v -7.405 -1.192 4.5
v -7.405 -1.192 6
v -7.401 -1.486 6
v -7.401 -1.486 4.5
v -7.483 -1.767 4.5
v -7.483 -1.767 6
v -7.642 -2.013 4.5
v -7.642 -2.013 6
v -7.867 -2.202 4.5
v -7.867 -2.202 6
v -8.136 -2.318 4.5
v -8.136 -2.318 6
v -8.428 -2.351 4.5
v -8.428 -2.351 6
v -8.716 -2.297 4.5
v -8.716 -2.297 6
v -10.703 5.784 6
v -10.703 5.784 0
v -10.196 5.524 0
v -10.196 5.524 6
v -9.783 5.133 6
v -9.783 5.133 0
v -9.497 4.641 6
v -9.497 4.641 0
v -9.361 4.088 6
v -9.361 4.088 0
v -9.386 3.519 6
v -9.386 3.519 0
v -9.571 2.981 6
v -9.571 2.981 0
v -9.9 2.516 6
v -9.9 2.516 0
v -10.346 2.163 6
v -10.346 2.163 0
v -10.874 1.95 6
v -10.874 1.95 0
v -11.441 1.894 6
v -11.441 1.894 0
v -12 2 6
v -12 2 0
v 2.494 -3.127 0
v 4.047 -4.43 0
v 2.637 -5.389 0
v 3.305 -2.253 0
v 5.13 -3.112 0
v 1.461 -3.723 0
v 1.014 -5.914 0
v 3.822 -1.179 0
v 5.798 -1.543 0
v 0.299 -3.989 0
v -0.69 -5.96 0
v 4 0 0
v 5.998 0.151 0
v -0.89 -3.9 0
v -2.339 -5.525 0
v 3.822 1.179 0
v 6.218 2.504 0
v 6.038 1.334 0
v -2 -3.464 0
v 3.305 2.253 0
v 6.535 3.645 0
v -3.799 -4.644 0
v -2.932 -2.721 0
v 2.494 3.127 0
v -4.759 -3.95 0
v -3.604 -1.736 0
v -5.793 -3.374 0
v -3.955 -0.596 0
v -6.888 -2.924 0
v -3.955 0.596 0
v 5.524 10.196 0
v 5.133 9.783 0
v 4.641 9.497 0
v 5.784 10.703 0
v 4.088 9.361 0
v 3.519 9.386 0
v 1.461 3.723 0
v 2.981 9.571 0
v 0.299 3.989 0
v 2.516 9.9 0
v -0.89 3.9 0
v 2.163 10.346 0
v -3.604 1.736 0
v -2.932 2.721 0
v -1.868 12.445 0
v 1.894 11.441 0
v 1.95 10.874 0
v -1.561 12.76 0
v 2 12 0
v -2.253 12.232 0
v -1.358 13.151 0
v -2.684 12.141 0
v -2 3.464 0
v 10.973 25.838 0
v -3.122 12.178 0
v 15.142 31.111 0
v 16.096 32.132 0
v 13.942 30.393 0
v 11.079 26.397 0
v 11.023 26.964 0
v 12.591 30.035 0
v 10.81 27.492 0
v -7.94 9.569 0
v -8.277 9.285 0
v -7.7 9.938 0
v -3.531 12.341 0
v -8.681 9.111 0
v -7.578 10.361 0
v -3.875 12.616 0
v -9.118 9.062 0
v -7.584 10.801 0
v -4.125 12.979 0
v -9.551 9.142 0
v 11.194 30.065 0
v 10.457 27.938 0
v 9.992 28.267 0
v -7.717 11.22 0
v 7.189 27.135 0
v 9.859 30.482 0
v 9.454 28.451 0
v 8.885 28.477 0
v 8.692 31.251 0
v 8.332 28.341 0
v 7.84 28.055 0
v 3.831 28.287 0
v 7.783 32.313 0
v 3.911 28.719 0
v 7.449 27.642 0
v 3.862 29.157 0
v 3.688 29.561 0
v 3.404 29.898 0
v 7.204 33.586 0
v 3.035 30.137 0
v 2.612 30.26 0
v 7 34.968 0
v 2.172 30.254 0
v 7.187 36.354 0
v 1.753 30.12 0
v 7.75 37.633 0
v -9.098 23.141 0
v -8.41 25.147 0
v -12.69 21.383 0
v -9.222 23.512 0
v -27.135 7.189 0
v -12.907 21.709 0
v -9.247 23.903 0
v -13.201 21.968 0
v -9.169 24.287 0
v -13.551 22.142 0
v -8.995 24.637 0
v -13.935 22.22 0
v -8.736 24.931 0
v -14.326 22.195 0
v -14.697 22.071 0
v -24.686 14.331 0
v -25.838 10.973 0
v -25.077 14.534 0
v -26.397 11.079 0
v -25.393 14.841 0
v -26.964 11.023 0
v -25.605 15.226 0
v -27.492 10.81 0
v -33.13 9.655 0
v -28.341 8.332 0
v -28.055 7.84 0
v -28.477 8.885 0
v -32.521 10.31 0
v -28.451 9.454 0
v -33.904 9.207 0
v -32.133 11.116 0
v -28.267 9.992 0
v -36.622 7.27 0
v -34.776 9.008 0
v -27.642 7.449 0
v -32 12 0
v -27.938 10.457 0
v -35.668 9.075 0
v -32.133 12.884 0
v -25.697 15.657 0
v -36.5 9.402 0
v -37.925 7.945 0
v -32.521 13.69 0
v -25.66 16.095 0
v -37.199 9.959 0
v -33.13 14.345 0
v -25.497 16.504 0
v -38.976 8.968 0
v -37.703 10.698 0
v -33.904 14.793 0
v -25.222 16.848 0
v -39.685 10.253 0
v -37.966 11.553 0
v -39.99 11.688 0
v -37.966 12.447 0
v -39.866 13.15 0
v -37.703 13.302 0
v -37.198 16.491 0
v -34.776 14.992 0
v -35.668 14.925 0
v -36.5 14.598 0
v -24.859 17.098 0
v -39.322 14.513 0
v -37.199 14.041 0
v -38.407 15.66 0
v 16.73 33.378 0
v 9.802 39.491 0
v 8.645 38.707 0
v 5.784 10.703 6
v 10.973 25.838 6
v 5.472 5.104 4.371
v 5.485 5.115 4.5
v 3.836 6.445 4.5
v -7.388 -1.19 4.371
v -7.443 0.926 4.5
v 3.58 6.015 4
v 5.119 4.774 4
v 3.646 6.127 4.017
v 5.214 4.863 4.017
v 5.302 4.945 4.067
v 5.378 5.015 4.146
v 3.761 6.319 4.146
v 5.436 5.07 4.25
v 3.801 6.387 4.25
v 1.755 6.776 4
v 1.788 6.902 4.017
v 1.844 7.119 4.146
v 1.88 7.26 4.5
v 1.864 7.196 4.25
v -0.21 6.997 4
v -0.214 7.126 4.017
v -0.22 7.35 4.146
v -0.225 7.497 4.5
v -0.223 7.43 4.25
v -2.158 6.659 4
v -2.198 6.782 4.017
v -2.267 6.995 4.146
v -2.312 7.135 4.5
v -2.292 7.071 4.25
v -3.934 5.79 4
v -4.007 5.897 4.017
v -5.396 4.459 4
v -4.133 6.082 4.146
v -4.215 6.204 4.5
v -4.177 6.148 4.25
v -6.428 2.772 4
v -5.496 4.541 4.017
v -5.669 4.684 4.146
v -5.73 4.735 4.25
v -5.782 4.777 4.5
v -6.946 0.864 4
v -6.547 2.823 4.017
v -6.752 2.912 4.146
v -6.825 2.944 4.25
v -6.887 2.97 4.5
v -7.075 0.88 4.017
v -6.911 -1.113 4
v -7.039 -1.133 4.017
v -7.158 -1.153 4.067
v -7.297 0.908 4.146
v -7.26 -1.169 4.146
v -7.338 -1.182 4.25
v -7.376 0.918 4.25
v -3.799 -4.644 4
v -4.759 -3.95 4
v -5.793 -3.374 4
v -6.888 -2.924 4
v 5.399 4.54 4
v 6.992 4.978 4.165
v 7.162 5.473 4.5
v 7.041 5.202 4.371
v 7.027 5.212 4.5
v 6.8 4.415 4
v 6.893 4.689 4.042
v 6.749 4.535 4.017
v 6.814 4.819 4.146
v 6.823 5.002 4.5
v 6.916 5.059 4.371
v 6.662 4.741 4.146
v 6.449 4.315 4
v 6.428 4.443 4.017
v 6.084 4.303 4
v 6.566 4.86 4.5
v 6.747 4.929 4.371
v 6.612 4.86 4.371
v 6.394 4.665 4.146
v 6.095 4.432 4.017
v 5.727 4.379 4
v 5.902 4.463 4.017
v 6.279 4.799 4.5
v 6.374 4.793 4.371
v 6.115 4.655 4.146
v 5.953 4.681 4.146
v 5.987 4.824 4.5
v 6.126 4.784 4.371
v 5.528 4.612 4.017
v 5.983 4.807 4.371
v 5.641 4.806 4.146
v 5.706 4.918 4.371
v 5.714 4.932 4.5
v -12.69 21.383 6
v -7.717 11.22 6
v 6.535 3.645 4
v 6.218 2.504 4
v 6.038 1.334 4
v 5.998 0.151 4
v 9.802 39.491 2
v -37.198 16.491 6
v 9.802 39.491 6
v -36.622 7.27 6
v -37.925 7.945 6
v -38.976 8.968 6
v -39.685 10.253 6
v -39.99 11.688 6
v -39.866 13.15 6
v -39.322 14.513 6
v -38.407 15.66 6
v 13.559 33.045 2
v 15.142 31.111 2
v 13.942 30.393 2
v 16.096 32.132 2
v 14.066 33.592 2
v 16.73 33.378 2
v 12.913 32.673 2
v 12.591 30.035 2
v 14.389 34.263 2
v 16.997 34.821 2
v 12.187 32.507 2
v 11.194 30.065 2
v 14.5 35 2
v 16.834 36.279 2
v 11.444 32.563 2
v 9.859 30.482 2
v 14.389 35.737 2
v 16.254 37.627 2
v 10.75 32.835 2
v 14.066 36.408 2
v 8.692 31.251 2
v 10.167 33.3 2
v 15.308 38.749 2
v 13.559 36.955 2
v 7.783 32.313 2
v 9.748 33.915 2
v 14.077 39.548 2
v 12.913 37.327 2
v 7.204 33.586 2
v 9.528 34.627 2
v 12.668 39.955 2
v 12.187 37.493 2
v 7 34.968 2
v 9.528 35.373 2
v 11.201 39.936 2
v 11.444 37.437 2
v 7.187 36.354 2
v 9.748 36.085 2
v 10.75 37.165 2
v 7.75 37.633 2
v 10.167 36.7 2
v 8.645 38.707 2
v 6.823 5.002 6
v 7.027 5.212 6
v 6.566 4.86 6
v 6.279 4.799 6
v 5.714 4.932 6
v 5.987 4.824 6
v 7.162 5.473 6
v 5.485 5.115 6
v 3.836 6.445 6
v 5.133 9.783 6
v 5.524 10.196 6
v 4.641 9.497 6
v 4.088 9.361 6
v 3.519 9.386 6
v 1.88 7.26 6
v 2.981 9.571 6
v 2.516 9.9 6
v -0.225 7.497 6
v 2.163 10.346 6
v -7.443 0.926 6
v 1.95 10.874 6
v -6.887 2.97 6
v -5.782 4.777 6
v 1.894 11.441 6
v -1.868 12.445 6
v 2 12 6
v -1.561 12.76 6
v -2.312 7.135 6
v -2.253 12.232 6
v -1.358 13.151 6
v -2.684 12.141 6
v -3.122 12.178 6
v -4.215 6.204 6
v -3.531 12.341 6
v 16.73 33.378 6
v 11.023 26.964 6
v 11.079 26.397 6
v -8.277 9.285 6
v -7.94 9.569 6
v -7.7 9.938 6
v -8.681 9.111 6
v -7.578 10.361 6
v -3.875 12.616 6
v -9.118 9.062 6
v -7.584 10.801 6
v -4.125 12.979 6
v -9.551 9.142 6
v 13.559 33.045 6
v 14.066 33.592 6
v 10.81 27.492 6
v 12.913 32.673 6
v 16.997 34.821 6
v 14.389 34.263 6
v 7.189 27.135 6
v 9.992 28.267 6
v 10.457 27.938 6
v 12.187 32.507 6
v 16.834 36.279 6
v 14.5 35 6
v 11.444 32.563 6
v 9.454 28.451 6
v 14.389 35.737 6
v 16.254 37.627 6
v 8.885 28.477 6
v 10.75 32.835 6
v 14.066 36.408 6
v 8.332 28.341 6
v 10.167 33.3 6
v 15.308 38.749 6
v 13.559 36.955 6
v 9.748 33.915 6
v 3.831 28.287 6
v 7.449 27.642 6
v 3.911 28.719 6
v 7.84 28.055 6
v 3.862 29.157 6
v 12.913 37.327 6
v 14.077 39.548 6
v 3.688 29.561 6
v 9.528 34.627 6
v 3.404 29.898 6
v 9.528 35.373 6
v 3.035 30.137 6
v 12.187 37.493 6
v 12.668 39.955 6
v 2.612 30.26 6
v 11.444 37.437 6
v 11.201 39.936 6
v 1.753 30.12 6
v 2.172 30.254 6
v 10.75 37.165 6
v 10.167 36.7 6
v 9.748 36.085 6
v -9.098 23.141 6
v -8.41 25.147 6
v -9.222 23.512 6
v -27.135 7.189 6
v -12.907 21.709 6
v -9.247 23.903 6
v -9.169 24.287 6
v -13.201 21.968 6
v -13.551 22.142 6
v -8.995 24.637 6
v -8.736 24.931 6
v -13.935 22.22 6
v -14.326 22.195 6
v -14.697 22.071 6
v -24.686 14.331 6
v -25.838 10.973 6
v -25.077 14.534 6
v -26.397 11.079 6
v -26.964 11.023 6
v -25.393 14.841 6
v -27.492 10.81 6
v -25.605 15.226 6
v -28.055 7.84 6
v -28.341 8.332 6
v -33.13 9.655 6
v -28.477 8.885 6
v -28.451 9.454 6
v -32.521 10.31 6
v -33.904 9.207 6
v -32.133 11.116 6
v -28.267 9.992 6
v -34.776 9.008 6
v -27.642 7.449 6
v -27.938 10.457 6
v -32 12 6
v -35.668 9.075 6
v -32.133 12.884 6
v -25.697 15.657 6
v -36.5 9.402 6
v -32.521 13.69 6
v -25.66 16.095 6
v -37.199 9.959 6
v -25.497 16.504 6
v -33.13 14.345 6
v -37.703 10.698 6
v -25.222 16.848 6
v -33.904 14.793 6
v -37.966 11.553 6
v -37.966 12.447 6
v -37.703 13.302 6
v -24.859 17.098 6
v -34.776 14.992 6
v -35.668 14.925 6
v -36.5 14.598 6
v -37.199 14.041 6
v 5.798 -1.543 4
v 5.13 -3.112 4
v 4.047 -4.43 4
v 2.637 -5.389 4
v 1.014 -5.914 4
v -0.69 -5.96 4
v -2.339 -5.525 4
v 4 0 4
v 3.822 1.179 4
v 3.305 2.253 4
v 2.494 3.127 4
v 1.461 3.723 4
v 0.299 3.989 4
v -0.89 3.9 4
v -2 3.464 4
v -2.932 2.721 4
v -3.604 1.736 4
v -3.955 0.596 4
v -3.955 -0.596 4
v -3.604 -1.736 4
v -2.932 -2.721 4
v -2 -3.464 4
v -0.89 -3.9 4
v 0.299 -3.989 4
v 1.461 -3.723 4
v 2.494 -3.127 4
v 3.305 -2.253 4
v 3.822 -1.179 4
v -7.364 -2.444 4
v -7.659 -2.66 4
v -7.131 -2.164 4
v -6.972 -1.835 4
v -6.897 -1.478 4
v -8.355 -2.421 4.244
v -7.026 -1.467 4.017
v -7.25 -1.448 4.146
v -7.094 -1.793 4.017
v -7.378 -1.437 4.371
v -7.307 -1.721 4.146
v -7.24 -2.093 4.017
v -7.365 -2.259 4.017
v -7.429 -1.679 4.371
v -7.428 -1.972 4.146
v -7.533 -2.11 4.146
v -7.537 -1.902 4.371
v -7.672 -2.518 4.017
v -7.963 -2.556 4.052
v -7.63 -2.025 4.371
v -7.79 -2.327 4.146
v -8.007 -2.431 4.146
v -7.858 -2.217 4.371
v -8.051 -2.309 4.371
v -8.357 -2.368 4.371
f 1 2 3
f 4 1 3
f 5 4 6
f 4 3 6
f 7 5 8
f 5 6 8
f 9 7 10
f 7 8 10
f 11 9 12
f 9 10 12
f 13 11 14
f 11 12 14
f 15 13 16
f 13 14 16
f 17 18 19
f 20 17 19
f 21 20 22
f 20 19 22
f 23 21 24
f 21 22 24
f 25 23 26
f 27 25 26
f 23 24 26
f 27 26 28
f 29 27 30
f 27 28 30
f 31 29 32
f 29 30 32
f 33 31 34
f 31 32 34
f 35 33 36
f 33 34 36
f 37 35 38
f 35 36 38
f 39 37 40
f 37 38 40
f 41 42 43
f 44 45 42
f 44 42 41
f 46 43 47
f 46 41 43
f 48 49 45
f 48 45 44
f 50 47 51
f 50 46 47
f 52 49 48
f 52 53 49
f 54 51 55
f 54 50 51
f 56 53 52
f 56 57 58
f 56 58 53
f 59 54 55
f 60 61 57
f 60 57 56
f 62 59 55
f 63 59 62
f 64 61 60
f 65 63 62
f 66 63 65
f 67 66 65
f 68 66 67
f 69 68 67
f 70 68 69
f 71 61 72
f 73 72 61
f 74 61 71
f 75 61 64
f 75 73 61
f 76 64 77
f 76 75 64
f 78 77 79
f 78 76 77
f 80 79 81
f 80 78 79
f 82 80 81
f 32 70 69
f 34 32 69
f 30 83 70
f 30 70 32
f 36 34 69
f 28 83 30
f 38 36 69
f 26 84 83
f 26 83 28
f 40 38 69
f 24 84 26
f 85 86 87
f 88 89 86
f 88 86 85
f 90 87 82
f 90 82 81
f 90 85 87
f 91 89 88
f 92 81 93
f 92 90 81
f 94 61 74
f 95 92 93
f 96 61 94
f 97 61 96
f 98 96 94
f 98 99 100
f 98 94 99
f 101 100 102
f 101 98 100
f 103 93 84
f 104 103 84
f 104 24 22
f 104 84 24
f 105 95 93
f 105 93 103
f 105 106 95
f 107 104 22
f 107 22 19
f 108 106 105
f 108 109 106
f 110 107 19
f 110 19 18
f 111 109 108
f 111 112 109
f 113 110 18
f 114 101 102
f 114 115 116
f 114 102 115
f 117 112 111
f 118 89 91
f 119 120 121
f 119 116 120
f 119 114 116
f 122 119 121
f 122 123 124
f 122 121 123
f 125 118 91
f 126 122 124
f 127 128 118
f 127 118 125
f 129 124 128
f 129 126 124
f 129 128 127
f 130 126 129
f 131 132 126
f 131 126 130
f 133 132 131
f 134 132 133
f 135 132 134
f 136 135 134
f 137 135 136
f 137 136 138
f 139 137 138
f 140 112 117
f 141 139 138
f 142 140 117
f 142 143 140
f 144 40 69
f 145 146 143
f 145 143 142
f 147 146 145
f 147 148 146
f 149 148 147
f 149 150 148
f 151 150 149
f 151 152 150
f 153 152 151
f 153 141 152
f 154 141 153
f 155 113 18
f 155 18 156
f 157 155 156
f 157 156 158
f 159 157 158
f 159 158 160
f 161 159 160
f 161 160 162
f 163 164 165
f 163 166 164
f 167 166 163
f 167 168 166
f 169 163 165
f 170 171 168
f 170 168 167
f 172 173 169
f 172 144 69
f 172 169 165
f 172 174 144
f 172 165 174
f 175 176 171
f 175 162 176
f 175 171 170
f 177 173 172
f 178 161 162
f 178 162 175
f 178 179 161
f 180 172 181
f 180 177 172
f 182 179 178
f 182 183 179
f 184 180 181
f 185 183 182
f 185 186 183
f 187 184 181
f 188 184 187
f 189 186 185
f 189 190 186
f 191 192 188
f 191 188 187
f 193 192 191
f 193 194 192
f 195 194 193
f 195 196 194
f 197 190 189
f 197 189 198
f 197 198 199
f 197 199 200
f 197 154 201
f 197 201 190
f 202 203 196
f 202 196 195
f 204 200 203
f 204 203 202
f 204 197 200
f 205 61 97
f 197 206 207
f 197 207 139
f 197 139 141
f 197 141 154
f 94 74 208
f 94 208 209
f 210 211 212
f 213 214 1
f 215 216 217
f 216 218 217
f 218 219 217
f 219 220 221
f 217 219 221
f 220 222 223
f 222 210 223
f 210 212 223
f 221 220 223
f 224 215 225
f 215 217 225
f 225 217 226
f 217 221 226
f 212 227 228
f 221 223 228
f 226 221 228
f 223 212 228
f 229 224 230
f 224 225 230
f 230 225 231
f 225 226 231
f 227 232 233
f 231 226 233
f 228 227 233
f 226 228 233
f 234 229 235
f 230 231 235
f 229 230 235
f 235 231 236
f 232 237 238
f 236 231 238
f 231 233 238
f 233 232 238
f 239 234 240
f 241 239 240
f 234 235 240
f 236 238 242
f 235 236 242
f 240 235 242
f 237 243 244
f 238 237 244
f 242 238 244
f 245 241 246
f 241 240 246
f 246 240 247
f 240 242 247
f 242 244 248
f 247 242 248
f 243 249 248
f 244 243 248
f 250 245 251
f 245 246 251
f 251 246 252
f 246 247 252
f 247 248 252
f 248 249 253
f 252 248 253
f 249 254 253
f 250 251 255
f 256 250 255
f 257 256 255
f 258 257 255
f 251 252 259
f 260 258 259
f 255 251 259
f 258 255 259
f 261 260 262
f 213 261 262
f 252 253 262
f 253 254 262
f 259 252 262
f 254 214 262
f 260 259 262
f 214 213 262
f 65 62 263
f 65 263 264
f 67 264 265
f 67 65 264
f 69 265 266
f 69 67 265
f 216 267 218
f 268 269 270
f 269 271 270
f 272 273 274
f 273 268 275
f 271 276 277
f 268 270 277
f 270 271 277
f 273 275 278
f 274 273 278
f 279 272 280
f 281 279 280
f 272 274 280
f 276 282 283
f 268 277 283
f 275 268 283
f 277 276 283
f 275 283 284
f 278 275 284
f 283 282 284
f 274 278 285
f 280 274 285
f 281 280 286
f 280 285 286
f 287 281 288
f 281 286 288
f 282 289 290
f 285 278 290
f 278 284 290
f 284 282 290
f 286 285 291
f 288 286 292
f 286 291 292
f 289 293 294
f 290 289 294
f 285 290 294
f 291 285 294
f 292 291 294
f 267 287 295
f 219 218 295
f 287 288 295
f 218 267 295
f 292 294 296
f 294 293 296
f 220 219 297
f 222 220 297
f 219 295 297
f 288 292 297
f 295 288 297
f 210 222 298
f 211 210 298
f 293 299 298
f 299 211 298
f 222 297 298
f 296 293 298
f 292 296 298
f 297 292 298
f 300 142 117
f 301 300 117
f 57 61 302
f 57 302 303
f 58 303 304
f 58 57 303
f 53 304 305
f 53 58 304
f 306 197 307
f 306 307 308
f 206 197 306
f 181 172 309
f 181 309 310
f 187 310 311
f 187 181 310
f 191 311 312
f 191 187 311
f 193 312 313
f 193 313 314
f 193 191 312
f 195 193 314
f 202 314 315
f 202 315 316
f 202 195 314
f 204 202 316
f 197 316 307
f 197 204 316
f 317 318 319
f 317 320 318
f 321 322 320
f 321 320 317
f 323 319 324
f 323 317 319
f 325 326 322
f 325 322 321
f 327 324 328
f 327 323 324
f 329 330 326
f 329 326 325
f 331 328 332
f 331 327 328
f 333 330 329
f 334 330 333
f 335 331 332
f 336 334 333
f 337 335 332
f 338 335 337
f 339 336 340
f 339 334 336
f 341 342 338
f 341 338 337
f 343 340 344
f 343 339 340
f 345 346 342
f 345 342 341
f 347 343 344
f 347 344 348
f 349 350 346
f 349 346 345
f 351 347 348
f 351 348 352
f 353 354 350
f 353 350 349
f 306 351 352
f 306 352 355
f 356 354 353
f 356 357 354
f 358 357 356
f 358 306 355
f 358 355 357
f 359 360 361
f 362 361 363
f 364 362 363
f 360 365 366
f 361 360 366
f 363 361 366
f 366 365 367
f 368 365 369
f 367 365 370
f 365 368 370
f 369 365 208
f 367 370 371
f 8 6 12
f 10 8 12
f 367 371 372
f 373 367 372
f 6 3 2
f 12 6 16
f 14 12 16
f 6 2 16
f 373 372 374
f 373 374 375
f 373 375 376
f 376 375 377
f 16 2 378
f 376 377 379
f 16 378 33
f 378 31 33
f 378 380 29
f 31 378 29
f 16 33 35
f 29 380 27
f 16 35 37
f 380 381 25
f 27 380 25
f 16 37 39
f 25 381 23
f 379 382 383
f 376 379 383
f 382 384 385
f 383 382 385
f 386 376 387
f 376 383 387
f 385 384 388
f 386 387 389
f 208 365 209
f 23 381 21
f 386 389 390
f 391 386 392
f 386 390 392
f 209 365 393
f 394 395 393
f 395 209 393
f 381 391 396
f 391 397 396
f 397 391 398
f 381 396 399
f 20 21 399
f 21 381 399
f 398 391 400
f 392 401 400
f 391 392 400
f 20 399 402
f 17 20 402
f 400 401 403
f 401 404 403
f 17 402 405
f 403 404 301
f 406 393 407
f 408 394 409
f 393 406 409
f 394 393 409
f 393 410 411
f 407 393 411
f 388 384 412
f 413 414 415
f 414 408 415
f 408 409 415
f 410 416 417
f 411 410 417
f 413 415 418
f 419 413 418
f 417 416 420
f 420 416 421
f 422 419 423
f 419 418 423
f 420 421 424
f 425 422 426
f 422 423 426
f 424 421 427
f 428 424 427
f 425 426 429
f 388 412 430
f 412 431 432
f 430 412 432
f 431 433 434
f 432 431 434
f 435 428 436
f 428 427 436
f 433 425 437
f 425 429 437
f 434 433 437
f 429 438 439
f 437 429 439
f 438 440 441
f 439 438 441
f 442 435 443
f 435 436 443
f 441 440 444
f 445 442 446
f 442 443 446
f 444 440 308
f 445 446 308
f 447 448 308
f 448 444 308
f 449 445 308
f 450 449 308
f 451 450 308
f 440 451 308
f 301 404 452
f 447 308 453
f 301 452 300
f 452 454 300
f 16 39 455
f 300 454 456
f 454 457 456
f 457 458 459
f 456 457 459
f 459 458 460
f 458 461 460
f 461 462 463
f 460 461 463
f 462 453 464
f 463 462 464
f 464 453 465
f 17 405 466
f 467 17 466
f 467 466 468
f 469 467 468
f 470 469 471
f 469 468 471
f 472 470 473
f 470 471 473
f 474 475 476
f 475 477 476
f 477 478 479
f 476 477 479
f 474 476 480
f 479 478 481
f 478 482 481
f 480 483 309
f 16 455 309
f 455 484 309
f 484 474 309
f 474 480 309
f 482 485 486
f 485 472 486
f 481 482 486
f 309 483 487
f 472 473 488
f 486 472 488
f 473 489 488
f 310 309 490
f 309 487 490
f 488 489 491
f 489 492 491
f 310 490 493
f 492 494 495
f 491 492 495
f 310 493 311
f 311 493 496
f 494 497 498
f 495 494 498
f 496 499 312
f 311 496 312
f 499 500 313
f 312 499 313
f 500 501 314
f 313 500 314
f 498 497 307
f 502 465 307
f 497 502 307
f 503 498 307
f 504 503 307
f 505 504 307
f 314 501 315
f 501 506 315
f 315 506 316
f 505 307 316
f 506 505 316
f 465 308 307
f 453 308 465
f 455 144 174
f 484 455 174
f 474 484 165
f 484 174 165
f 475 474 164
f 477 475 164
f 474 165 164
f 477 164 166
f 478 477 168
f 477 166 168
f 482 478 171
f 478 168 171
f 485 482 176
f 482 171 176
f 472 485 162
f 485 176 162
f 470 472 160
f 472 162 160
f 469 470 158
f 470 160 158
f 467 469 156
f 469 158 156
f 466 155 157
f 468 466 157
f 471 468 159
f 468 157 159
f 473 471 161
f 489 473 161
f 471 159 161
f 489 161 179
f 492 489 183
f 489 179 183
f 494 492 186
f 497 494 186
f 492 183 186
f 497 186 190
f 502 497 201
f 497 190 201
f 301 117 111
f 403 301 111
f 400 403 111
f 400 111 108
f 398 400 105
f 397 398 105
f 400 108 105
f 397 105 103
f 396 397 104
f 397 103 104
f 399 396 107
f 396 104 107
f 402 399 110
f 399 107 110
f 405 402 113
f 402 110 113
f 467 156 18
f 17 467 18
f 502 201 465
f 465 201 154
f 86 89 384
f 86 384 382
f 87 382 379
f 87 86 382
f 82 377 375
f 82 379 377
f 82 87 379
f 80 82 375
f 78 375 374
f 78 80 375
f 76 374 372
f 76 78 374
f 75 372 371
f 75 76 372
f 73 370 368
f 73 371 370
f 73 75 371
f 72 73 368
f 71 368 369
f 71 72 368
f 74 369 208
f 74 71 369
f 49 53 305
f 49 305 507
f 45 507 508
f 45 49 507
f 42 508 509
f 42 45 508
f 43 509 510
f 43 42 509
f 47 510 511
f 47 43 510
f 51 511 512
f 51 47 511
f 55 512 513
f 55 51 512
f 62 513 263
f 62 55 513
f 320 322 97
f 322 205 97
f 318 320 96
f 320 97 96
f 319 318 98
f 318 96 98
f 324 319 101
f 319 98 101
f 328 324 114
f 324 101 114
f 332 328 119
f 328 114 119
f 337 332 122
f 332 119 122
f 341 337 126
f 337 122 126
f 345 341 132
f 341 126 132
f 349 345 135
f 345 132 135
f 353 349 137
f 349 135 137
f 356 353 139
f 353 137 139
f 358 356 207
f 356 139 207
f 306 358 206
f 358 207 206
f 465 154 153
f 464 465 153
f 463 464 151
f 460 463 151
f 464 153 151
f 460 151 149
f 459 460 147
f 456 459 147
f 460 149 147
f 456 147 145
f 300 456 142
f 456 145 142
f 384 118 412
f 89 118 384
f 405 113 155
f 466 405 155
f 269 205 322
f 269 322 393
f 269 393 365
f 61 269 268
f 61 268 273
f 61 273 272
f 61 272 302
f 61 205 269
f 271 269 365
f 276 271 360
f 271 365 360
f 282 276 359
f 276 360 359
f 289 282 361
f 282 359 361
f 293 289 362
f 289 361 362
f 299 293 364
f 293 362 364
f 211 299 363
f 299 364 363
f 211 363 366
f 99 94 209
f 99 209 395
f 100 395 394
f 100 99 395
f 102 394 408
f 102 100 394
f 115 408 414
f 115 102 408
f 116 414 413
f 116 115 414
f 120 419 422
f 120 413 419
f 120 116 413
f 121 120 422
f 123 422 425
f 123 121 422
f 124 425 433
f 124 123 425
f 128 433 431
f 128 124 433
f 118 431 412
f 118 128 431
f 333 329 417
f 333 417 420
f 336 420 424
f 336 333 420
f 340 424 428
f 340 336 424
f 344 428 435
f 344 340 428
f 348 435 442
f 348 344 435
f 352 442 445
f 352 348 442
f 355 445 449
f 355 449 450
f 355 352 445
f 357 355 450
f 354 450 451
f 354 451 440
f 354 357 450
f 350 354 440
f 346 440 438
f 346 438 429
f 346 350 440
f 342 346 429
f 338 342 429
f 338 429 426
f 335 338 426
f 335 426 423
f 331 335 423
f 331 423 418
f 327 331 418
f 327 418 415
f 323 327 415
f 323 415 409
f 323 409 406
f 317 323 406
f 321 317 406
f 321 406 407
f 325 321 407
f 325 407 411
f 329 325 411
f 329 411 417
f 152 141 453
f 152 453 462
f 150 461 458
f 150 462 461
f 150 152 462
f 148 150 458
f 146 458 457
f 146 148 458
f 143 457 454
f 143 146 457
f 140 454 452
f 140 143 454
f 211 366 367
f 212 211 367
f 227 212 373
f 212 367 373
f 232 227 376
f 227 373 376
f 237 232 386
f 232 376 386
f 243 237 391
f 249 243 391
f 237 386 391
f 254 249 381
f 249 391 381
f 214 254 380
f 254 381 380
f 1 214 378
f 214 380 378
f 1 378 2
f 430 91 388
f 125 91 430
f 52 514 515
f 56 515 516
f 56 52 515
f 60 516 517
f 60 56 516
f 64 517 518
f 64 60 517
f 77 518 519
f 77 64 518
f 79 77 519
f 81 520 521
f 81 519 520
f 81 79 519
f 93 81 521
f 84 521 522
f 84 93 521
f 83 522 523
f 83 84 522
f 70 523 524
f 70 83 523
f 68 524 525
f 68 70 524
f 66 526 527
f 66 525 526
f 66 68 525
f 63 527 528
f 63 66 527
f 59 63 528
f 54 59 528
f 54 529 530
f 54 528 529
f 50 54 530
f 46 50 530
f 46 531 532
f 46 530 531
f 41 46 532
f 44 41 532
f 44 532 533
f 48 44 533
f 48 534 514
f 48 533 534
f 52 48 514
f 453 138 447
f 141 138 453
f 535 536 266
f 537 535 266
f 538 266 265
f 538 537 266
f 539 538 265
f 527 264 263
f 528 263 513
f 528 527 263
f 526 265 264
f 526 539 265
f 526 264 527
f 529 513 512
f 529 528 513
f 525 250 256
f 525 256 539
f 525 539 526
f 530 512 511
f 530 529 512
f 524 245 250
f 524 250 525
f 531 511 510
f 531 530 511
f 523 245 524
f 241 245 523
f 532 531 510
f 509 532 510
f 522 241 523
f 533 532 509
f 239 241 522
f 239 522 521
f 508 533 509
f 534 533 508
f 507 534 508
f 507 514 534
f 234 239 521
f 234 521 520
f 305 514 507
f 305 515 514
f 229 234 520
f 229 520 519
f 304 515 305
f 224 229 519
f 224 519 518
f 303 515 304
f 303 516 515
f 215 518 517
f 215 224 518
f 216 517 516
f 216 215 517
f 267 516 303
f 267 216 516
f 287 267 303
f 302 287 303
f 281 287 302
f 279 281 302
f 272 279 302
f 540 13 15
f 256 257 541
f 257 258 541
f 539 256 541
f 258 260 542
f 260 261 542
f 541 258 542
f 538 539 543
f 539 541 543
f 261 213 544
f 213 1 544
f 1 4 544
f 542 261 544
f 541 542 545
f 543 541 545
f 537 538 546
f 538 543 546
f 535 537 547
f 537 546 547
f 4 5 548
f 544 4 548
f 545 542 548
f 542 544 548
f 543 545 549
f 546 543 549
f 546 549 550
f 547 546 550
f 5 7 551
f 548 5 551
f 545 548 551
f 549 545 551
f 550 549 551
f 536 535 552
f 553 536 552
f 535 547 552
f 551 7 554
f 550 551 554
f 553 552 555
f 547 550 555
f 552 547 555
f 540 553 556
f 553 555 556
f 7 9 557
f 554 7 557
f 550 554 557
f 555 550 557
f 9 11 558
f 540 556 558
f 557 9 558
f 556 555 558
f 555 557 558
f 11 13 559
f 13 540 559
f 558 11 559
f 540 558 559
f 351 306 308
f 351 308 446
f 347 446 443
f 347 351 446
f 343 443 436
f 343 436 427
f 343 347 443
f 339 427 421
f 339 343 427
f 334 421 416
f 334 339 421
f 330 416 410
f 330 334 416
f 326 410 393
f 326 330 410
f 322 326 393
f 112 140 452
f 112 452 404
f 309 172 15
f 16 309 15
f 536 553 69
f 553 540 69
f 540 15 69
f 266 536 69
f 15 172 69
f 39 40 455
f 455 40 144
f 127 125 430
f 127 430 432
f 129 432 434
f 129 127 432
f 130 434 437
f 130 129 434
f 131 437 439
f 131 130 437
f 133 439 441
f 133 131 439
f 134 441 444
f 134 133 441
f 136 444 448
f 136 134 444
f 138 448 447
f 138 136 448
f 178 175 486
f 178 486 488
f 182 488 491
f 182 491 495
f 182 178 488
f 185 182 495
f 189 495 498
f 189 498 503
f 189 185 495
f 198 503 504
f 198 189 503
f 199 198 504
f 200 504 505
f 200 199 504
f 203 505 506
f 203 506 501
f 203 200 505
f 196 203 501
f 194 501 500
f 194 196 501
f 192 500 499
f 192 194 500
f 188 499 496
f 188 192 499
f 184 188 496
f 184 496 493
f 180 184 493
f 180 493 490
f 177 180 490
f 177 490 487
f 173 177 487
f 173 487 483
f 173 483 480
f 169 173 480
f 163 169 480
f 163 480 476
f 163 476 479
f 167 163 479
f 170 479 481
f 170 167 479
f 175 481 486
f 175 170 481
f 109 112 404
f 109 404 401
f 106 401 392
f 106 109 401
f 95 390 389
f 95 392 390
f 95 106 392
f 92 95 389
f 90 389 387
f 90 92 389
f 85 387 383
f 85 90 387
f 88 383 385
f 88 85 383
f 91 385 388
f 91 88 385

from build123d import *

# Parameters (mm, degrees)
SKETCH1_R               = 3
SKETCH1_R_2             = 4
SKETCH1_R_3             = 2.5
BOSS_EXTRUDE1_DEPTH     = 6
CUT_EXTRUDE1_DEPTH      = 57.885850613
CUT_EXTRUDE1_DEPTH_BACK = 57.885850613
SKETCH4_R               = 7.5
CUT_EXTRUDE2_DEPTH      = 2
FILLET1_R               = 1
FILLET2_R               = 0.5
SKETCH5_R               = 5
CUT_EXTRUDE4_DEPTH      = 2


with BuildPart() as part:
    # Sketch1 → Boss-Extrude1 (new body)
    with BuildSketch(Plane.XY):
        with BuildLine():
            Line((16.72972973, 33.378378378), (6.535491145, 3.645182505))
            ThreePointArc((6.535491145, 3.645182505), (6.111138498, 1.921892634), (5.998106477, 0.150727223))
            ThreePointArc((5.998106477, 0.150727223), (2.637317184, -5.389300332), (-3.799375872, -4.643785415))
            ThreePointArc((-3.799375872, -4.643785415), (-5.267291655, -3.646275313), (-6.888425749, -2.923968315))
            Line((-6.888425749, -2.923968315), (-36.621621622, 7.27027027))
            ThreePointArc((-36.621621622, 7.27027027), (-39.99026822, 11.688193819), (-37.19776432, 16.49108361))
            Line((-37.19776432, 16.49108361), (9.80223568, 39.49108361))
            ThreePointArc((9.80223568, 39.49108361), (15.308172233, 38.749132763), (16.72972973, 33.378378378))
        make_face()
        with Locations((-35, 12)):
            Circle(SKETCH1_R, mode=Mode.SUBTRACT)
        Circle(SKETCH1_R_2, mode=Mode.SUBTRACT)
        with Locations((12, 35)):
            Circle(SKETCH1_R_3, mode=Mode.SUBTRACT)
    extrude(amount=BOSS_EXTRUDE1_DEPTH)

    # Sketch2 → Cut-Extrude1 (cut, two sides: drawn at the far end of the back side and taken through both)
    with BuildSketch(Plane.XY.offset(6).offset(-CUT_EXTRUDE1_DEPTH_BACK)):
        with BuildLine():
            Line((-24.859247394, 17.097563964), (-14.697085232, 22.070536937))
            ThreePointArc((-14.697085232, 22.070536937), (-13.551269449, 22.142130773), (-12.690430853, 21.38254115))
            Line((-12.690430853, 21.38254115), (-7.71745788, 11.220378988))
            ThreePointArc((-7.71745788, 11.220378988), (-7.940043134, 9.568598022), (-9.551269449, 9.142130773))
            Line((-9.551269449, 9.142130773), (-24.686404584, 14.331319962))
            ThreePointArc((-24.686404584, 14.331319962), (-25.696998564, 15.656697027), (-24.859247394, 17.097563964))
        make_face()
        with BuildLine():
            Line((-25.837837838, 10.972972973), (-10.702702703, 5.783783784))
            ThreePointArc((-10.702702703, 5.783783784), (-9.459459459, 3.243243243), (-12, 2))
            Line((-12, 2), (-27.135135135, 7.189189189))
            ThreePointArc((-27.135135135, 7.189189189), (-28.378378378, 9.72972973), (-25.837837838, 10.972972973))
        make_face()
        with BuildLine():
            Line((-9.097563964, 23.140752606), (-4.124590991, 12.978590444))
            ThreePointArc((-4.124590991, 12.978590444), (-2.683724054, 12.140839274), (-1.358346989, 13.151433254))
            Line((-1.358346989, 13.151433254), (3.8308422, 28.286568389))
            ThreePointArc((3.8308422, 28.286568389), (3.404374951, 29.897794704), (1.752593985, 30.120379958))
            Line((1.752593985, 30.120379958), (-8.409568177, 25.147406985))
            ThreePointArc((-8.409568177, 25.147406985), (-9.1691578, 24.286568389), (-9.097563964, 23.140752606))
        make_face()
        with BuildLine():
            Line((7.189189189, 27.135135135), (2, 12))
            ThreePointArc((2, 12), (3.243243243, 9.459459459), (5.783783784, 10.702702703))
            Line((5.783783784, 10.702702703), (10.972972973, 25.837837838))
            ThreePointArc((10.972972973, 25.837837838), (9.72972973, 28.378378378), (7.189189189, 27.135135135))
        make_face()
    extrude(amount=CUT_EXTRUDE1_DEPTH + CUT_EXTRUDE1_DEPTH_BACK, mode=Mode.SUBTRACT)

    # Sketch4 → Cut-Extrude2 (cut)
    with BuildSketch(Plane.XY.offset(6)):
        Circle(SKETCH4_R)
    extrude(amount=-CUT_EXTRUDE2_DEPTH, mode=Mode.SUBTRACT)

    # Fillet1
    fillet1_edges = [part.edges().sort_by_distance(p)[0] for p in [
        (6.54275782, 3.666376974, 5),
        (-6.909620217, -2.91670164, 5),
    ]]
    fillet(fillet1_edges, radius=FILLET1_R)

    # Fillet2
    # the kernel refuses this fillet: 0.5 mm, written as the material it adds along each edge
    with BuildSketch(Plane(origin=(0, 0, 4), x_dir=(0.7313195548489669, 0.6820349761526229, 0), z_dir=(0.6820349761526229, -0.7313195548489669, 0))) as fillet2_piece_1:
        with BuildLine():
            CenterArc((7.5 - FILLET2_R, FILLET2_R), FILLET2_R, 270, 90)
            Line((7.5 - FILLET2_R, 0), (7.5, 0))
            Line((7.5, 0), (7.5, FILLET2_R))
        make_face()
    revolve(axis=Axis((0, 0, 4), (0, 0, 1)), revolution_arc=146.144973872)
    with BuildSketch(Plane(origin=(6.216216216, 5.797297297, 4), x_dir=(0.6053689071166585, 0.7959450271823945, 0), z_dir=(-0.7959450271823945, 0.6053689071166585, 0))) as fillet2_piece_2_section:
        with BuildLine():
            CenterArc((1 + FILLET2_R, -FILLET2_R), FILLET2_R, 90, 90)
            Line((1, -FILLET2_R), (1, 0))
            Line((1, 0), (1 + FILLET2_R, 0))
        make_face()
    fillet2_piece_2 = revolve(axis=Axis((6.216216216, 5.797297297, 4), (0, 0, -1)), revolution_arc=189.741738526, mode=Mode.PRIVATE)
    fillet2_piece_2 = split(fillet2_piece_2, bisect_by=Plane(origin=(6.878990216, 4.647054795, 4.123474389), z_dir=(-0.945945945945946, 0.32432432432432406, 0)), keep=Keep.TOP, mode=Mode.PRIVATE)
    add(fillet2_piece_2)
    with BuildSketch(Plane(origin=(-8.391891892, -1.351351351, 4), x_dir=(0.9872813990461049, 0.1589825119236894, 0), z_dir=(-0.1589825119236894, 0.9872813990461049, 0))) as fillet2_piece_3_section:
        with BuildLine():
            CenterArc((1 + FILLET2_R, -FILLET2_R), FILLET2_R, 90, 90)
            Line((1 + FILLET2_R, 0), (1, 0))
            Line((1, 0), (1, -FILLET2_R))
        make_face()
    fillet2_piece_3 = revolve(axis=Axis((-8.391891892, -1.351351351, 4), (0, 0, -1)), revolution_arc=189.741738526, mode=Mode.PRIVATE)
    fillet2_piece_3 = split(fillet2_piece_3, bisect_by=Plane(origin=(-7.890298213, -2.580469184, 4.123474408), z_dir=(0.3243243243243243, 0.9459459459459462, 0)), keep=Keep.TOP, mode=Mode.PRIVATE)
    add(fillet2_piece_3)

    # Sketch5 → Cut-Extrude4 (cut)
    with BuildSketch(Plane(origin=(0, 0, 0), x_dir=(-1, 0, 0), z_dir=(0, 0, -1))):
        with Locations((-12, 35)):
            Circle(SKETCH5_R)
    extrude(amount=-CUT_EXTRUDE4_DEPTH, mode=Mode.SUBTRACT)


solid = part.part
